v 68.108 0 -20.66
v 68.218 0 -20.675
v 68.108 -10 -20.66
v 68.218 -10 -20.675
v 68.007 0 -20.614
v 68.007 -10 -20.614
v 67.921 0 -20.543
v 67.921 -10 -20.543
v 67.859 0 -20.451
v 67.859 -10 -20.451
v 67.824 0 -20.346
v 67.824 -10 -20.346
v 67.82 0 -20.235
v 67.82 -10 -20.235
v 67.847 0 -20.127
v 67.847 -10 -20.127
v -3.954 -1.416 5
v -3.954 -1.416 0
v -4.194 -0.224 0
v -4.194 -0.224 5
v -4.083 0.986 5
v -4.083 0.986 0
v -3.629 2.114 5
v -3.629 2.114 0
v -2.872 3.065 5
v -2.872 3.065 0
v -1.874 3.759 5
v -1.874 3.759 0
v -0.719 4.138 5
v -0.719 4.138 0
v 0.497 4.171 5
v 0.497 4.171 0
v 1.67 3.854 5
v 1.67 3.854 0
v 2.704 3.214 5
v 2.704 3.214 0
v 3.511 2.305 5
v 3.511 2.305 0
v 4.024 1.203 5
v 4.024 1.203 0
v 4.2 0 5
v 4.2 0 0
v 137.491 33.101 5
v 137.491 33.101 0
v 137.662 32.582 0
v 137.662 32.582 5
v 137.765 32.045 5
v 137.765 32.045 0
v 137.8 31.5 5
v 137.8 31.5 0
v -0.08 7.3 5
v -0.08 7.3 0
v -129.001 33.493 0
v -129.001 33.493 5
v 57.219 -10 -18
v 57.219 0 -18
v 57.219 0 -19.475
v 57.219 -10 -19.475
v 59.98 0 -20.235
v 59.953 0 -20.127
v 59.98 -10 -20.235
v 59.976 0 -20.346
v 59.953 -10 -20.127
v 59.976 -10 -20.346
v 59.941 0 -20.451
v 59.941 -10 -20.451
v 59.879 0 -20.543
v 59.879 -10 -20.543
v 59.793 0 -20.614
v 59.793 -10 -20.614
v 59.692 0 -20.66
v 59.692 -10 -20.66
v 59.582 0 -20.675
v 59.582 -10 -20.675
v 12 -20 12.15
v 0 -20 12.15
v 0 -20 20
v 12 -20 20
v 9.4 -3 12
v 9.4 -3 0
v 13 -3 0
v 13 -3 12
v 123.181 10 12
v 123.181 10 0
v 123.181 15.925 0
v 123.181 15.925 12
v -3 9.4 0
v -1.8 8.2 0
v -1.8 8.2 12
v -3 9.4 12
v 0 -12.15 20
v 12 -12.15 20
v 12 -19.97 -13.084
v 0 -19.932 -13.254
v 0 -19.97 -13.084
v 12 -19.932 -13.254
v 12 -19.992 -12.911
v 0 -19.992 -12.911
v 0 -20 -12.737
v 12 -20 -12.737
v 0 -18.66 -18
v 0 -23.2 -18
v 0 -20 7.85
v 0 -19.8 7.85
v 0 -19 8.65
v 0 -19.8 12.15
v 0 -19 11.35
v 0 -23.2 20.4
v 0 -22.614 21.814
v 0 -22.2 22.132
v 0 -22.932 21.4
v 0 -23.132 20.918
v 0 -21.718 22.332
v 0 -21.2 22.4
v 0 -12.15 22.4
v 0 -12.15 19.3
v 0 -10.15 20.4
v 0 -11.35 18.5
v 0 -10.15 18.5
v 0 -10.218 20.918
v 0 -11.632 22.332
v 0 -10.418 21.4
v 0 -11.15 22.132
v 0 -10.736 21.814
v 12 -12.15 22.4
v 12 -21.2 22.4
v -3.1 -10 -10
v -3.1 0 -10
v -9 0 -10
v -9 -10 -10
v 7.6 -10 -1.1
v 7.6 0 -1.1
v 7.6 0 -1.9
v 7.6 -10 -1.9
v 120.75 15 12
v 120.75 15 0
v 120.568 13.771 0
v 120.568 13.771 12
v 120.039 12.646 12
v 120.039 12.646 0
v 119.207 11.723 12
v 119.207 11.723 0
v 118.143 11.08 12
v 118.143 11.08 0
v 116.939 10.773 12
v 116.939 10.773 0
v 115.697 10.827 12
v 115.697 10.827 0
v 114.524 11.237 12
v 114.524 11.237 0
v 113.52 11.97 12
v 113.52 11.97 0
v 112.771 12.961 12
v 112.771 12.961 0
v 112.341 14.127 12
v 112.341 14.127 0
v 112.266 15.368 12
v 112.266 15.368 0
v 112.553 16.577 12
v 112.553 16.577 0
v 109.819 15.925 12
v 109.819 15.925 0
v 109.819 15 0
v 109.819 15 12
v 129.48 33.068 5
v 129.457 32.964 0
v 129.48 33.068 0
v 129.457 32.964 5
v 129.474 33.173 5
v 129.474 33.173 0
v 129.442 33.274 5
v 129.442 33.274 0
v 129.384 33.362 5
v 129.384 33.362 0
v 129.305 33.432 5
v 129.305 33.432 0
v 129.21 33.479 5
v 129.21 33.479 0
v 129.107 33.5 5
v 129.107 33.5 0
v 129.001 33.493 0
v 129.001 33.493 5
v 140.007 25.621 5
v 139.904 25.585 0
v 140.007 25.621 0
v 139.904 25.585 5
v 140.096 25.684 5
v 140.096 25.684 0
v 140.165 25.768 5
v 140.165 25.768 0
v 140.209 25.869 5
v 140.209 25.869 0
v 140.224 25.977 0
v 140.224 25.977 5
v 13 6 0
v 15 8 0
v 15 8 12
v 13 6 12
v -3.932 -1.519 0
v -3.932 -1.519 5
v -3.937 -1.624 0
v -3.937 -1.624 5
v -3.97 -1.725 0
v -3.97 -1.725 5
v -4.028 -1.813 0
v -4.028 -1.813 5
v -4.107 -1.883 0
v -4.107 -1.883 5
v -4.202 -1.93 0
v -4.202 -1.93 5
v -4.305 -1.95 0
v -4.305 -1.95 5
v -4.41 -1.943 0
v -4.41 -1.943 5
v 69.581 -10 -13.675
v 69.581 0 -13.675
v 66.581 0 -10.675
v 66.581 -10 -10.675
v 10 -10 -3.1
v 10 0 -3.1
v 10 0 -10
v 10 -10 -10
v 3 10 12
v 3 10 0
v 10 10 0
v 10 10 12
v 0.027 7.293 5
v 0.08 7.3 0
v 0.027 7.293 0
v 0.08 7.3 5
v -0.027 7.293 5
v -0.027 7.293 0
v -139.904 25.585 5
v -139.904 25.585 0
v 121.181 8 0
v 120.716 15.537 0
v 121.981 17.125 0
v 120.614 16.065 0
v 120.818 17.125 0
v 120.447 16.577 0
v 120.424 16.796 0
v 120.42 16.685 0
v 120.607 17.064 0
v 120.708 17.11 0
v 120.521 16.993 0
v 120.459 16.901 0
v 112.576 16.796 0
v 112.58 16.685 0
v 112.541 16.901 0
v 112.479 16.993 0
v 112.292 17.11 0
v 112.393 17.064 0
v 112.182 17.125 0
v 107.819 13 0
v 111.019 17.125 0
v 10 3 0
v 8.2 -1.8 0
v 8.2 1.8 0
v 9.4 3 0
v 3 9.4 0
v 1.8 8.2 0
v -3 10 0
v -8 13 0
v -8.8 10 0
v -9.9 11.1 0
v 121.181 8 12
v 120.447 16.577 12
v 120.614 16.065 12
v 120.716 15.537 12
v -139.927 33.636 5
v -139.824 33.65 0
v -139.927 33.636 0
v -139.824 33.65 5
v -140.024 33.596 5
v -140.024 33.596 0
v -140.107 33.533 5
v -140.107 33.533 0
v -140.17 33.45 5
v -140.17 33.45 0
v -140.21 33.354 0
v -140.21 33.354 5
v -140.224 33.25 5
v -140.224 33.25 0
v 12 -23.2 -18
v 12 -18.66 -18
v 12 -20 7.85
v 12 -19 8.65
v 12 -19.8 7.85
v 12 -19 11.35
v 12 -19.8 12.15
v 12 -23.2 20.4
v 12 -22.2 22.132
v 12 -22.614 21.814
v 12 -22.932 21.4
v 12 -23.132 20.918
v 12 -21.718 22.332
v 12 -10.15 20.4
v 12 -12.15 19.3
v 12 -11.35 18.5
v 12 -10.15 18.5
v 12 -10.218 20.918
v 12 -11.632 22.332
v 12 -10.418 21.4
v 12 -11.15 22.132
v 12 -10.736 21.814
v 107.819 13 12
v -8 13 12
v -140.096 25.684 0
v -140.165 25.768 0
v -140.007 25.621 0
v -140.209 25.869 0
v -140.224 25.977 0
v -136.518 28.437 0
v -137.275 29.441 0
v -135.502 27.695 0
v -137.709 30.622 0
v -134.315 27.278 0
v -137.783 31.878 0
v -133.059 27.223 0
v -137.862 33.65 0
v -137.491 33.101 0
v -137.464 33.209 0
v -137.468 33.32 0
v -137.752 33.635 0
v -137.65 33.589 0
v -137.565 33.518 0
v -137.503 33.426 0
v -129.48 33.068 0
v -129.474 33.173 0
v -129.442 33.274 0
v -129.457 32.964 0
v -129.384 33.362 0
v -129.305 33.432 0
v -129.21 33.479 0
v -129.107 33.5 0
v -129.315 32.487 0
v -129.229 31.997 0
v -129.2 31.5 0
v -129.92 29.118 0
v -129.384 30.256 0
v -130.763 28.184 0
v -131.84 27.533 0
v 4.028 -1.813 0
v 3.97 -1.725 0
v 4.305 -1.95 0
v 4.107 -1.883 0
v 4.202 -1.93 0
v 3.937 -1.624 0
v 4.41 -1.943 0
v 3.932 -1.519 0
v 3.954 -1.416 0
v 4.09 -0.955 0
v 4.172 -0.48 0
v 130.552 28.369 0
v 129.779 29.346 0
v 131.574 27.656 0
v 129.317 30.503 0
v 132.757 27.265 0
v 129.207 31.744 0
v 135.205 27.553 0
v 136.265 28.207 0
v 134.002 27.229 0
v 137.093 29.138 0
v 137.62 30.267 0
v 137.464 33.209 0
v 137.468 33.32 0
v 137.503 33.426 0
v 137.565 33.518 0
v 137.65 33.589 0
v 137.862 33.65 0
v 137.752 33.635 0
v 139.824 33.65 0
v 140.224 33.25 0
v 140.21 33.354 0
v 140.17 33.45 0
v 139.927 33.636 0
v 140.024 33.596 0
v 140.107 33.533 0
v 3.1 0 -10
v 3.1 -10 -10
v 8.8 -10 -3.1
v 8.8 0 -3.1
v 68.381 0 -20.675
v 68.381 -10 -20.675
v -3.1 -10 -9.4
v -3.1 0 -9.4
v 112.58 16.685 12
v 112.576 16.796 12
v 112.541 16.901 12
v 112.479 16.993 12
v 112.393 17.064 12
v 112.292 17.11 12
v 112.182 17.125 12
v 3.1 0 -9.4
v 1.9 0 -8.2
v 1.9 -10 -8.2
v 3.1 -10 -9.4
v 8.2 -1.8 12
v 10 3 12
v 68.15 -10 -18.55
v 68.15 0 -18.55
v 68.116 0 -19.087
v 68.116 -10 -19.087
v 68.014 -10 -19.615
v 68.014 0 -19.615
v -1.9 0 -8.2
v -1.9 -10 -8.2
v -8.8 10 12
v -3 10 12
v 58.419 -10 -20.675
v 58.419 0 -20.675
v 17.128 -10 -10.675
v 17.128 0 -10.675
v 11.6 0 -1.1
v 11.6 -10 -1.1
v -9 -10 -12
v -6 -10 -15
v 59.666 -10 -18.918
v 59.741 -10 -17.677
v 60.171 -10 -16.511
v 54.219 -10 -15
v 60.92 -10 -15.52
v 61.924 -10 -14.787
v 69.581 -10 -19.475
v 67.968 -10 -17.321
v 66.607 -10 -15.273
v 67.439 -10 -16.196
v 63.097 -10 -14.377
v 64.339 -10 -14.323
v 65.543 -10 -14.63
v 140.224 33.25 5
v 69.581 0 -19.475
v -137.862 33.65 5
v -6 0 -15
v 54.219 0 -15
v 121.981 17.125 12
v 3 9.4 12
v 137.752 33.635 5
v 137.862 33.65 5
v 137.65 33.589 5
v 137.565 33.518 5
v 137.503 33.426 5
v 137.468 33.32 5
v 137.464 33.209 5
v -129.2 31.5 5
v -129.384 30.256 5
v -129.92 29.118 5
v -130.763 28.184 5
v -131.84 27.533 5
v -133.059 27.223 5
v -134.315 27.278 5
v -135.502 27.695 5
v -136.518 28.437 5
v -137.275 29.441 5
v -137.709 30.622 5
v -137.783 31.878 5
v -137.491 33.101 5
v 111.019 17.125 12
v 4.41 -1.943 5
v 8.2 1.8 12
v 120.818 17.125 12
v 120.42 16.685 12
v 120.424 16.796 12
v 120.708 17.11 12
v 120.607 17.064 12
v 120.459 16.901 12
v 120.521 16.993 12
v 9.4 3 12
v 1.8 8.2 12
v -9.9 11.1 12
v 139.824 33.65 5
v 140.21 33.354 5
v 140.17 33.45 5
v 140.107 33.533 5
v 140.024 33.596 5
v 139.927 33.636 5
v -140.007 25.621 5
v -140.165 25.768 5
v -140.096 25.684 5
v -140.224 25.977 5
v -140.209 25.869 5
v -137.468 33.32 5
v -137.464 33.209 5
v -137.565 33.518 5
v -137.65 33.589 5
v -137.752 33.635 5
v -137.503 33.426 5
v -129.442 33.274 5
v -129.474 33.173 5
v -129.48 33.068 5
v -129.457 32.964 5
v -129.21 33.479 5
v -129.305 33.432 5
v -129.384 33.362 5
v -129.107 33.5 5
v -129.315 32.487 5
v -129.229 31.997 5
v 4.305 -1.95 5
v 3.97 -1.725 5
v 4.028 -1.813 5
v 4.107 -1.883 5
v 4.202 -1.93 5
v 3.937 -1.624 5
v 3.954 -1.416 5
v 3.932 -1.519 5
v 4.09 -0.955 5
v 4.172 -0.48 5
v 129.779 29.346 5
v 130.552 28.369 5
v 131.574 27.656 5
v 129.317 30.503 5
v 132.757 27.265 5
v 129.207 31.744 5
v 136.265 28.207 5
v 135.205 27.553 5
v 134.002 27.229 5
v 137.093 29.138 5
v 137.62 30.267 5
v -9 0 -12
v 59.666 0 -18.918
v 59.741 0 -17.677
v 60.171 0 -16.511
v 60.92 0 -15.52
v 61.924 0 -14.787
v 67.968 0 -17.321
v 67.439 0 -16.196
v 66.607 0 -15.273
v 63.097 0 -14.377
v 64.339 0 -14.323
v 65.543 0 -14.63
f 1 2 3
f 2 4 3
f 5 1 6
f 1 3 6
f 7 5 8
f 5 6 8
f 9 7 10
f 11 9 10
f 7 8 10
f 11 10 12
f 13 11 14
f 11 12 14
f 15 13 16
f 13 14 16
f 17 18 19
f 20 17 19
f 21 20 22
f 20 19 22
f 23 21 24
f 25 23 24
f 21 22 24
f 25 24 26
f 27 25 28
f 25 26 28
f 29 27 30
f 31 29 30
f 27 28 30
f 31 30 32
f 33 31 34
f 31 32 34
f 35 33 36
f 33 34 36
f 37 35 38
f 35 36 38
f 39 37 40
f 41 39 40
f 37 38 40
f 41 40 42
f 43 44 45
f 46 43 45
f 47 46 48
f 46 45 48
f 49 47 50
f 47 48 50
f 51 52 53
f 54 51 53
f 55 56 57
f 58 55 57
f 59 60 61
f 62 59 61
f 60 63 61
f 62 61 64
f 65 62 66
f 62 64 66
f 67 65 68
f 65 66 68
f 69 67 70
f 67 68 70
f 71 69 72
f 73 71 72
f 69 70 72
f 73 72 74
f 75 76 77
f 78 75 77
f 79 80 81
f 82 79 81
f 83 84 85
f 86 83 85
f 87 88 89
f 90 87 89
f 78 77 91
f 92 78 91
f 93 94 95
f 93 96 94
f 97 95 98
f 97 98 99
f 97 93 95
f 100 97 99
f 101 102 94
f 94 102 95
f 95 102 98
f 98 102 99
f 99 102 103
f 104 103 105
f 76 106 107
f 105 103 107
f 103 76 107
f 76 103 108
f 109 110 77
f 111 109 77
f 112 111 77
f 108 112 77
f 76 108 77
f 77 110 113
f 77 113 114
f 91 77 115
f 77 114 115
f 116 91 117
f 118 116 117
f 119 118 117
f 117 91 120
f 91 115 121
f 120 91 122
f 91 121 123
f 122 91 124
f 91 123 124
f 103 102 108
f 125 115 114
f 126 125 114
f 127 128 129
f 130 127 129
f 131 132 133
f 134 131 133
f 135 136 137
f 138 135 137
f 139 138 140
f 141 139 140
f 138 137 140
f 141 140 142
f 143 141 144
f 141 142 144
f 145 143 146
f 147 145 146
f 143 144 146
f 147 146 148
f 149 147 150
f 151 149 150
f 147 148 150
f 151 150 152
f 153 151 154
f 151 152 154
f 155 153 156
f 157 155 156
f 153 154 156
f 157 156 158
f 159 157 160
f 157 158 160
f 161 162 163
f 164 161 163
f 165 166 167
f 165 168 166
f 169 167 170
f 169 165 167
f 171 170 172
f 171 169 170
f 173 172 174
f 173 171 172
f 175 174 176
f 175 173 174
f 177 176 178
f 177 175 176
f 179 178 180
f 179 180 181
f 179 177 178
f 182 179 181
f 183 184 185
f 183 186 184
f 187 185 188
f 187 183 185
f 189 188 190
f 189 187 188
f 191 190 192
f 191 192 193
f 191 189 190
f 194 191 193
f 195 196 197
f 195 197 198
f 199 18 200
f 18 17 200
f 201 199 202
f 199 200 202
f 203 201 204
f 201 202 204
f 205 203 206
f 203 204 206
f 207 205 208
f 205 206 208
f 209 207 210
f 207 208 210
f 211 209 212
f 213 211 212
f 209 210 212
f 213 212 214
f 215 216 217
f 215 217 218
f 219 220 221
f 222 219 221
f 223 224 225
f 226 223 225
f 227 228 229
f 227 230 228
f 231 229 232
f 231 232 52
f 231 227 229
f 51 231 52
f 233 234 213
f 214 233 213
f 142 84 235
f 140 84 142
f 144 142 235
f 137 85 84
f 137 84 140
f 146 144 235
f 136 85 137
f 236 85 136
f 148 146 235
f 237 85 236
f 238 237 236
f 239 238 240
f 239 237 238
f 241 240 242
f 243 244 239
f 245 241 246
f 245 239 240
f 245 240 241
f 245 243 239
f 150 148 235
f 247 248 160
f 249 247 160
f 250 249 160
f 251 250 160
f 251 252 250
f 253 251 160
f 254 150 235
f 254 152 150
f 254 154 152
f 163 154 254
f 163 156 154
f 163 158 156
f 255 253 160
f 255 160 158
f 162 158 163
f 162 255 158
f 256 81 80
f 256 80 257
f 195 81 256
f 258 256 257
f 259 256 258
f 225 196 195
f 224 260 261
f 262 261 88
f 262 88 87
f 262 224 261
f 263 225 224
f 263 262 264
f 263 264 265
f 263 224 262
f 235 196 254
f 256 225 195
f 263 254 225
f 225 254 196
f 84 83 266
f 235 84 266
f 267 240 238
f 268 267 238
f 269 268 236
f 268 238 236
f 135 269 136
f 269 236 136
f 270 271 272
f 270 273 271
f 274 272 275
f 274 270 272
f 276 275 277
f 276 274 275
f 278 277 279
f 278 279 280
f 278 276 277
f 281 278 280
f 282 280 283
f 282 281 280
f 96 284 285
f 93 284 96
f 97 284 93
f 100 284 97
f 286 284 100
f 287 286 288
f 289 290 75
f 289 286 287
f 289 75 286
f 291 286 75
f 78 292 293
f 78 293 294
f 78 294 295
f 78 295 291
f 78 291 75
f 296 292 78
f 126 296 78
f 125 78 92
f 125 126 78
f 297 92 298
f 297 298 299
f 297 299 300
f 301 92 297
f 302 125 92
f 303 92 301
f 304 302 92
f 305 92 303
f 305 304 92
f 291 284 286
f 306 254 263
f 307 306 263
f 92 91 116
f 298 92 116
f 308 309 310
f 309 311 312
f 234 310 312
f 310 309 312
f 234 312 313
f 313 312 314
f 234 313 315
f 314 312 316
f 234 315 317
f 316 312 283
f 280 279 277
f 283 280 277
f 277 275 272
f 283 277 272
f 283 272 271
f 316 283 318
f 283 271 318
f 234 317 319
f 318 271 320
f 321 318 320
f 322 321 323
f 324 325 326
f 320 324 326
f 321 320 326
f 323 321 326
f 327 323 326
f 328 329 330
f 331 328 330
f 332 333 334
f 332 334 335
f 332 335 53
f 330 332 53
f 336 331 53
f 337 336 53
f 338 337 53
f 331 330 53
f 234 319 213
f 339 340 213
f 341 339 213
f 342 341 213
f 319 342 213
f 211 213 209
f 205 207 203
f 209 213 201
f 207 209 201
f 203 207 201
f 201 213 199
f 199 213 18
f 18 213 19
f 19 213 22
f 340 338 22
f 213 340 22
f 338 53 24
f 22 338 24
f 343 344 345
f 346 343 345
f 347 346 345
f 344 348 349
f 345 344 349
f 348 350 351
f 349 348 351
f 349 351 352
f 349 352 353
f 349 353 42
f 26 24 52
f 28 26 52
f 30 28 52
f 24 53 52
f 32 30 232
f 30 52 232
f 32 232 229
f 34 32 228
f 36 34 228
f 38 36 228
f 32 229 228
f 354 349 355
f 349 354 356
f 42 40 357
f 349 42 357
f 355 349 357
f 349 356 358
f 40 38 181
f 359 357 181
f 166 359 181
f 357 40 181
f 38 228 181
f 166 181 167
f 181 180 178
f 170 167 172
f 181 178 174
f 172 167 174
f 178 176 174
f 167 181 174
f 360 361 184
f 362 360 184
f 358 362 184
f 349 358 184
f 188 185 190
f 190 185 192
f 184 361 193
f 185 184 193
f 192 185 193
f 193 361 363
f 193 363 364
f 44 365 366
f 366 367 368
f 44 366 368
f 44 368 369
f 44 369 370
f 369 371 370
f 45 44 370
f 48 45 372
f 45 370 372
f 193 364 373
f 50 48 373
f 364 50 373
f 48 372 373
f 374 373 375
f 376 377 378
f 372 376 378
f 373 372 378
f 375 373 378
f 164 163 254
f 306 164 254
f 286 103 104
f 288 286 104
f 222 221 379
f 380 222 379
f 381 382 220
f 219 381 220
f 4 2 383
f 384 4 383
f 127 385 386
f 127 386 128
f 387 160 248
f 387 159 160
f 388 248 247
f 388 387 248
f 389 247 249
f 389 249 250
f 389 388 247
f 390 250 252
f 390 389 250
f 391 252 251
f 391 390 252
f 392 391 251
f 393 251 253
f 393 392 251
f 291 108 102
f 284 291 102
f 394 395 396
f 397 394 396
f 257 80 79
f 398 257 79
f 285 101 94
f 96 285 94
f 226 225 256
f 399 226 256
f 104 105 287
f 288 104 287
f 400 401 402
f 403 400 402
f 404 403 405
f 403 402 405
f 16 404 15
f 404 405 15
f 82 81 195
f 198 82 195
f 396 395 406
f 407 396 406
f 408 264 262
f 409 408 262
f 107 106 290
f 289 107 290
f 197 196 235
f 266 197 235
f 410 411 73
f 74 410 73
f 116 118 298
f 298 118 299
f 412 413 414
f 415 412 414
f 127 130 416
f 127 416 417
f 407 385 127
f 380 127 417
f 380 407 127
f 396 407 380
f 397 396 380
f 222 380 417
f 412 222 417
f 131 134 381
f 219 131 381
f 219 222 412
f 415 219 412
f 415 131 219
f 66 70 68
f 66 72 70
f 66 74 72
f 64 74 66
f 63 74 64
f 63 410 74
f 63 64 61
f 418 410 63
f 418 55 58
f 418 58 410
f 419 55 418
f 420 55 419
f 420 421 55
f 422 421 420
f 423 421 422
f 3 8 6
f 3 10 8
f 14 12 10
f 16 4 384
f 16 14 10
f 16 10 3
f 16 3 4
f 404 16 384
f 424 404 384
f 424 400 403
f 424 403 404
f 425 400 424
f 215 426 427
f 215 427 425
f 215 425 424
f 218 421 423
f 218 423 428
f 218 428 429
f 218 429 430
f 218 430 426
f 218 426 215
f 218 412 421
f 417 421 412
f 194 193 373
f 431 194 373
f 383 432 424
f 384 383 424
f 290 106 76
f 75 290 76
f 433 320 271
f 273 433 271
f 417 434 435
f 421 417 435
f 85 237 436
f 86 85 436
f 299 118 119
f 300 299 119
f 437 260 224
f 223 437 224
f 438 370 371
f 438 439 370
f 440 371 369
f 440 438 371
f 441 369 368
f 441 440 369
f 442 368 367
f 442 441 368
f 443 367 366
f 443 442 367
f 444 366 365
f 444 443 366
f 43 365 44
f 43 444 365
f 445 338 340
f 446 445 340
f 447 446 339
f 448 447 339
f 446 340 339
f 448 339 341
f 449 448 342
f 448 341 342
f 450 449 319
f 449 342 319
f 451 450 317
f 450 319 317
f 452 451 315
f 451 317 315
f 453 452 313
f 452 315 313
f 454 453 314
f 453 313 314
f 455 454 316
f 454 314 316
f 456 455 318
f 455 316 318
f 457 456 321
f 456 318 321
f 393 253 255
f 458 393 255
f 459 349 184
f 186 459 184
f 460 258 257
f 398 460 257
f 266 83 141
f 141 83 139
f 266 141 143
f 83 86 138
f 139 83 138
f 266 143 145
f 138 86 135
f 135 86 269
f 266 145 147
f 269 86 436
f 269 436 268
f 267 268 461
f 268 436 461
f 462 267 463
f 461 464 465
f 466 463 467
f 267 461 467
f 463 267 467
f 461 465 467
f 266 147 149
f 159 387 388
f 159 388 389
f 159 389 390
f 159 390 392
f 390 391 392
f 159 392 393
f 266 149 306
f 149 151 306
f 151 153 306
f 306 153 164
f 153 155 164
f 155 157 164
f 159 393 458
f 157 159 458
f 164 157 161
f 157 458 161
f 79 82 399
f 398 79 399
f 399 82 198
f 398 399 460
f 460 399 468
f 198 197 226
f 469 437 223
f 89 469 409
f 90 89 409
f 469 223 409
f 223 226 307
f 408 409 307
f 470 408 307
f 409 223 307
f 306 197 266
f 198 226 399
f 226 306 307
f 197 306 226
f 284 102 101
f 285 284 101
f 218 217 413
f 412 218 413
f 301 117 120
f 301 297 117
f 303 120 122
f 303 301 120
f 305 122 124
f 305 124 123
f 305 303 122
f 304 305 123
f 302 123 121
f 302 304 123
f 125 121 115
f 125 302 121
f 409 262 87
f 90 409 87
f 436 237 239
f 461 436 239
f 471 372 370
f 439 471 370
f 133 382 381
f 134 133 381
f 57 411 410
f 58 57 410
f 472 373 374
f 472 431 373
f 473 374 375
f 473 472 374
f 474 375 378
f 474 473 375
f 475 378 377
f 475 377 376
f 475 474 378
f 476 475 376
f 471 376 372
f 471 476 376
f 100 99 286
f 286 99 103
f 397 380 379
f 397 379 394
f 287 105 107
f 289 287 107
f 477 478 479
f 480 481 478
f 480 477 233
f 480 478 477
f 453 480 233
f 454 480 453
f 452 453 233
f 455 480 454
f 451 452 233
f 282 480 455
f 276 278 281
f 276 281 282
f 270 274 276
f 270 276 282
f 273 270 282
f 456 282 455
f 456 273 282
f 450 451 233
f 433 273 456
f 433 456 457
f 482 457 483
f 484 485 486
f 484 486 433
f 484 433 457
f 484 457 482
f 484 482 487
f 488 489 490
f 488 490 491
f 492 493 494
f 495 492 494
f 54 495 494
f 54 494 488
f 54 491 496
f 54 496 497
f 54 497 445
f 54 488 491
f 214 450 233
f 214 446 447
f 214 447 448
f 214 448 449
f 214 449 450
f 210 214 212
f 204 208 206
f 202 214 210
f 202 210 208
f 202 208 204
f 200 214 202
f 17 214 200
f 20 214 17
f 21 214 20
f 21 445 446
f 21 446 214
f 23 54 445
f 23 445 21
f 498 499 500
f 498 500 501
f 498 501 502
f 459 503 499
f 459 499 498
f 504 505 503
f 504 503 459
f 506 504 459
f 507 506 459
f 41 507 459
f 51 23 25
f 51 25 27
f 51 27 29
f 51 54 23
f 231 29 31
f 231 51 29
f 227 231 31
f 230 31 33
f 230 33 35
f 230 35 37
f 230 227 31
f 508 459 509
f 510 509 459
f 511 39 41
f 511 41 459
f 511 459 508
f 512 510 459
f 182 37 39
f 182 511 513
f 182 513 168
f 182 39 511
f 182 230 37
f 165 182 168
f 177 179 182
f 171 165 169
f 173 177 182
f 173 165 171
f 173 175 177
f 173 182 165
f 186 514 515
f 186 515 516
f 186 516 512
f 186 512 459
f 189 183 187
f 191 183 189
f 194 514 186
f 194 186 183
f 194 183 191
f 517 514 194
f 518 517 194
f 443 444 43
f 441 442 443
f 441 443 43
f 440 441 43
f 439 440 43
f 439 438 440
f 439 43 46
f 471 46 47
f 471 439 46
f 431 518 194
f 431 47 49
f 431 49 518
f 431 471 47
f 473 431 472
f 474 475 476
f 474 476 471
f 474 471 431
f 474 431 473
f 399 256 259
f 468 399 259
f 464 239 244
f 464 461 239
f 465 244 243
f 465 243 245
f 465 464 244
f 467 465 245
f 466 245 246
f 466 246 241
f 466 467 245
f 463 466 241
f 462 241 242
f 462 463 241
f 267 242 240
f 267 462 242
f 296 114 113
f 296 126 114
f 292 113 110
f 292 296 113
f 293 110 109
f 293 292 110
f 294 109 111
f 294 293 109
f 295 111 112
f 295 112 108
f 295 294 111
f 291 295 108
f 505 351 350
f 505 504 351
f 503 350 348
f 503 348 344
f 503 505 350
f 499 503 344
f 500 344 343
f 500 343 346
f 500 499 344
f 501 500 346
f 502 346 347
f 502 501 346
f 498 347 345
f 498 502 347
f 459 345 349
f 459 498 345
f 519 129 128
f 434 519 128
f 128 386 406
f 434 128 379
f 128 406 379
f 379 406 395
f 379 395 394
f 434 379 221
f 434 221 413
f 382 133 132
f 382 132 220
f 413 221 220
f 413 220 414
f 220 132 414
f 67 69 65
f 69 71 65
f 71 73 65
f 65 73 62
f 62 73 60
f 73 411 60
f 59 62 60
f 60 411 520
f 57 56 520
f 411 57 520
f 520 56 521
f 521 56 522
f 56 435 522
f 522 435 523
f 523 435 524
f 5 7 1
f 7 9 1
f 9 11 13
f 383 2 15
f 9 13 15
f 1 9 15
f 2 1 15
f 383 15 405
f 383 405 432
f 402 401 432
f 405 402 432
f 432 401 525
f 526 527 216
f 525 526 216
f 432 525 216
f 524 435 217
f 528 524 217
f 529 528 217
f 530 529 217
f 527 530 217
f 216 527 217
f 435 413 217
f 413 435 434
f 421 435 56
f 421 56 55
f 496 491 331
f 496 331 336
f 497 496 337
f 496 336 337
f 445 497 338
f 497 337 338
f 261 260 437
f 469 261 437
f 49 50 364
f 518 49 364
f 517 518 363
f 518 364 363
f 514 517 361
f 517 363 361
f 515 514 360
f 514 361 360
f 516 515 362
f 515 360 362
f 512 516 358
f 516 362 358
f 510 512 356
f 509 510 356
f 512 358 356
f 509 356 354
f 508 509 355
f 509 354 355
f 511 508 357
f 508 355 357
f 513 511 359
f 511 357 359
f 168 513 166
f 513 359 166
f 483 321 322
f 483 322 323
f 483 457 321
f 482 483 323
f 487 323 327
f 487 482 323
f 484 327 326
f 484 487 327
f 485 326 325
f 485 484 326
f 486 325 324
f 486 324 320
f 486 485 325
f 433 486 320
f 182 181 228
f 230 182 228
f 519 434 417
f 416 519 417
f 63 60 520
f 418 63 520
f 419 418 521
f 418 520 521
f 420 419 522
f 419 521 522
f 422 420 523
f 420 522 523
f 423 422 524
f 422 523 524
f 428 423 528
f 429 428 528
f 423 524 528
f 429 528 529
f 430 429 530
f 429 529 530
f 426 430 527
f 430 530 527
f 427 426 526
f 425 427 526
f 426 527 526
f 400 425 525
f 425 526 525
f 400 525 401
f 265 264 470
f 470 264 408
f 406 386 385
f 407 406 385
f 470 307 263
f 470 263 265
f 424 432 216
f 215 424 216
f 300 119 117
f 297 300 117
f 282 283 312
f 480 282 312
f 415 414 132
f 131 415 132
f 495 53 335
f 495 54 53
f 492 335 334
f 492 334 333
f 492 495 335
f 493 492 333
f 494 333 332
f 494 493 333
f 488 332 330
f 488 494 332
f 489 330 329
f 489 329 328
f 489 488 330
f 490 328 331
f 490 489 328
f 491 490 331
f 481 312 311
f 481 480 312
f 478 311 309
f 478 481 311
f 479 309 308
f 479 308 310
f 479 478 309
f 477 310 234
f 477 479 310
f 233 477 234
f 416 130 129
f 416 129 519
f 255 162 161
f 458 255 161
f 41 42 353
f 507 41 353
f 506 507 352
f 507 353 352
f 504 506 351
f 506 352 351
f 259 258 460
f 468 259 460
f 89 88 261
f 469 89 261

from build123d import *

# Parameters (mm, degrees)
F2_DEPTH    = 10
F3_SIZE     = 1.2
F4_SIZE     = 3
F6_DEPTH    = 12
F7_SIZE     = 1.2
F8_T1_DEPTH = 12
F8_T3_DEPTH = 22.2867319519
F9_R        = 0.4
F9_2_R      = 0.4
F15_DEPTH   = 5
F16_R       = 0.4
F12_DEPTH   = 12
F13_SIZE    = 0.8
F14_R       = 2


# Not quite as in the source:
# - a fillet or chamfer that OpenCascade refuses, or shapes differently, is made with other operations: its cross-section is extruded or revolved along the edge and cut away or added


with BuildPart() as f2:
    # F1 (on Front) → F2 (new body)
    with BuildSketch(Plane.XZ):
        with BuildLine():
            Line((7.6, -1.1), (7.6, -3.1))
            Line((7.6, -3.1), (10, -3.1))
            Line((10, -3.1), (10, -10))
            Line((10, -10), (3.1, -10))
            Line((3.1, -10), (3.1, -8.2))
            Line((3.1, -8.2), (-3.1, -8.2))
            Line((-3.1, -8.2), (-3.1, -10))
            Line((-3.1, -10), (-9, -10))
            Line((-9, -10), (-9, -15))
            Line((-9, -15), (57.2193920339, -15))
            Line((57.2193920339, -15), (57.2193920339, -20.675))
            Line((57.2193920339, -20.675), (60.2193920339, -20.675))
            ThreePointArc((60.2193920339, -20.675), (62.8000190583, -14.4448152383), (68.15, -18.55))
            ThreePointArc((68.15, -18.55), (68.0051847617, -19.6499809417), (67.5806079661, -20.675))
            Line((67.5806079661, -20.675), (69.5806079661, -20.675))
            Line((69.5806079661, -20.675), (69.5806079661, -10.675))
            Line((69.5806079661, -10.675), (17.1281288275, -10.675))
            Line((17.1281288275, -10.675), (11.6, -1.1))
            Line((11.6, -1.1), (7.6, -1.1))
        make_face()
    extrude(amount=F2_DEPTH)

    # F3
    f3_edges = [f2.edges().sort_by_distance(p)[0] for p in [
        (-3.1, -5, -8.2),
        (3.1, -5, -8.2),
        (7.6, -5, -3.1),
        (57.219392, -5, -20.675),
        (69.580608, -5, -20.675),
    ]]
    chamfer(f3_edges, length=F3_SIZE)

    # F4
    f4_edges = [f2.edges().sort_by_distance(p)[0] for p in [
        (-9, -5, -15),
        (57.219392, -5, -15),
        (69.580608, -5, -10.675),
    ]]
    chamfer(f4_edges, length=F4_SIZE)

    # F9
    f9_edges = [f2.edges().sort_by_distance(p)[0] for p in [
        (60.219392, -5, -20.675),
        (67.580608, -5, -20.675),
    ]]
    fillet(f9_edges, radius=F9_R)


with BuildPart() as f6:
    # F5 (on Top) → F6 (new body)
    with BuildSketch(Plane.XY):
        with BuildLine():
            ThreePointArc((120.1806079661, 17.125), (120.6051847617, 16.0999809417), (120.75, 15))
            ThreePointArc((120.75, 15), (115.4000190583, 10.8948152383), (112.8193920339, 17.125))
            Line((112.8193920339, 17.125), (109.8193920339, 17.125))
            Line((109.8193920339, 17.125), (109.8193920339, 13))
            Line((109.8193920339, 13), (-10, 13))
            Line((-10, 13), (-10, 10))
            Line((-10, 10), (-3, 10))
            Line((-3, 10), (-3, 8.2))
            Line((-3, 8.2), (3, 8.2))
            Line((3, 8.2), (3, 10))
            Line((3, 10), (10, 10))
            Line((10, 10), (10, 3))
            Line((10, 3), (8.2, 3))
            Line((8.2, 3), (8.2, -3))
            Line((8.2, -3), (10, -3))
            Line((10, -3), (13, -3))
            Line((13, -3), (13, 8))
            Line((13, 8), (123.1806079661, 8))
            Line((123.1806079661, 8), (123.1806079661, 17.125))
            Line((123.1806079661, 17.125), (120.1806079661, 17.125))
        make_face()
    extrude(amount=F6_DEPTH)

    # F7
    f7_edges = [f6.edges().sort_by_distance(p)[0] for p in [
        (8.2, 3, 6),
        (8.2, -3, 6),
        (-3, 8.2, 6),
        (3, 8.2, 6),
        (-10, 10, 6),
        (109.819392, 17.125, 6),
        (123.180608, 17.125, 6),
    ]]
    chamfer(f7_edges, length=F7_SIZE)

    # F8: chamfer of 2 on 4 edges, made by hand

    # F8_s2 → F8_t1 (join)
    with BuildSketch(Plane.XY):
        Polygon((15, 8), (13, 6), (13, 8), align=None)
        Polygon((109.8193920339, 15), (107.8193920339, 13), (109.8193920339, 13), align=None)
    extrude(amount=F8_T1_DEPTH)

    # F8_s4 → F8_t3 (cut)
    with BuildSketch(Plane.XY.offset(-5.1433659759)):
        Polygon((-8, 13), (-10, 11), (-10, 13), align=None)
        Polygon((123.1806079661, 10), (121.1806079661, 8), (123.1806079661, 8), align=None)
    extrude(amount=F8_T3_DEPTH, mode=Mode.SUBTRACT)

    # F9#2
    f9_2_edges = [f6.edges().sort_by_distance(p)[0] for p in [
        (112.819392, 17.125, 6),
        (120.180608, 17.125, 6),
    ]]
    fillet(f9_2_edges, radius=F9_2_R)


with BuildPart() as f15:
    # F10 (on Top) → F15 (new body)
    with BuildSketch(Plane.XY):
        with BuildLine():
            ThreePointArc((-3.6373066959, -2.1), (-1.0870399894, 4.0568884704), (4.2, 0))
            ThreePointArc((4.2, 0), (4.0568884704, -1.0870399894), (3.6373066959, -2.1))
            Line((3.6373066959, -2.1), (140.2239092363, 25.65))
            Line((140.2239092363, 25.65), (140.2239092363, 33.65))
            Line((140.2239092363, 33.65), (137.2239092363, 33.65))
            ThreePointArc((137.2239092363, 33.65), (137.653481053, 32.6129218939), (137.8, 31.5))
            ThreePointArc((137.8, 31.5), (132.3870781061, 27.346518947), (129.7760907637, 33.65))
            Line((129.7760907637, 33.65), (0, 7.2836767171))
            Line((0, 7.2836767171), (-129.7760907637, 33.65))
            ThreePointArc((-129.7760907637, 33.65), (-129.346518947, 32.6129218939), (-129.2, 31.5))
            ThreePointArc((-129.2, 31.5), (-134.6129218939, 27.346518947), (-137.2239092363, 33.65))
            Line((-137.2239092363, 33.65), (-140.2239092363, 33.65))
            Line((-140.2239092363, 33.65), (-140.2239092363, 25.65))
            Line((-140.2239092363, 25.65), (-3.6373066959, -2.1))
        make_face()
    extrude(amount=F15_DEPTH)

    # F16
    f16_edges = [f15.edges().sort_by_distance(p)[0] for p in [
        (-3.637307, -2.1, 2.5),
        (3.637307, -2.1, 2.5),
        (0, 7.283677, 2.5),
        (129.776091, 33.65, 2.5),
        (137.223909, 33.65, 2.5),
        (140.223909, 33.65, 2.5),
        (140.223909, 25.65, 2.5),
        (-140.223909, 33.65, 2.5),
        (-140.223909, 25.65, 2.5),
        (-129.776091, 33.65, 2.5),
        (-137.223909, 33.65, 2.5),
    ]]
    fillet(f16_edges, radius=F16_R)


with BuildPart() as f12:
    # F11 (on Right) → F12 (new body)
    with BuildSketch(Plane.YZ):
        Polygon((-12.15, 20), (-12.15, 18.5), (-10.15, 18.5), (-10.15, 22.4), (-23.2, 22.4), (-23.2, -18), (-18.6602540378, -18), (-20, -13), (-20, 7.85), (-19, 7.85), (-19, 12.15), (-20, 12.15), (-20, 20), align=None)
    extrude(amount=F12_DEPTH)

    # F13
    f13_edges = [f12.edges().sort_by_distance(p)[0] for p in [
        (6, -19, 12.15),
        (6, -12.15, 18.5),
        (6, -19, 7.85),
    ]]
    chamfer(f13_edges, length=F13_SIZE)

    # F14
    f14_edges = [f12.edges().sort_by_distance(p)[0] for p in [
        (6, -23.2, 22.4),
        (6, -20, -13),
        (6, -10.15, 22.4),
    ]]
    fillet(f14_edges, radius=F14_R)


solid = Compound([f2.part, f6.part, f15.part, f12.part])
